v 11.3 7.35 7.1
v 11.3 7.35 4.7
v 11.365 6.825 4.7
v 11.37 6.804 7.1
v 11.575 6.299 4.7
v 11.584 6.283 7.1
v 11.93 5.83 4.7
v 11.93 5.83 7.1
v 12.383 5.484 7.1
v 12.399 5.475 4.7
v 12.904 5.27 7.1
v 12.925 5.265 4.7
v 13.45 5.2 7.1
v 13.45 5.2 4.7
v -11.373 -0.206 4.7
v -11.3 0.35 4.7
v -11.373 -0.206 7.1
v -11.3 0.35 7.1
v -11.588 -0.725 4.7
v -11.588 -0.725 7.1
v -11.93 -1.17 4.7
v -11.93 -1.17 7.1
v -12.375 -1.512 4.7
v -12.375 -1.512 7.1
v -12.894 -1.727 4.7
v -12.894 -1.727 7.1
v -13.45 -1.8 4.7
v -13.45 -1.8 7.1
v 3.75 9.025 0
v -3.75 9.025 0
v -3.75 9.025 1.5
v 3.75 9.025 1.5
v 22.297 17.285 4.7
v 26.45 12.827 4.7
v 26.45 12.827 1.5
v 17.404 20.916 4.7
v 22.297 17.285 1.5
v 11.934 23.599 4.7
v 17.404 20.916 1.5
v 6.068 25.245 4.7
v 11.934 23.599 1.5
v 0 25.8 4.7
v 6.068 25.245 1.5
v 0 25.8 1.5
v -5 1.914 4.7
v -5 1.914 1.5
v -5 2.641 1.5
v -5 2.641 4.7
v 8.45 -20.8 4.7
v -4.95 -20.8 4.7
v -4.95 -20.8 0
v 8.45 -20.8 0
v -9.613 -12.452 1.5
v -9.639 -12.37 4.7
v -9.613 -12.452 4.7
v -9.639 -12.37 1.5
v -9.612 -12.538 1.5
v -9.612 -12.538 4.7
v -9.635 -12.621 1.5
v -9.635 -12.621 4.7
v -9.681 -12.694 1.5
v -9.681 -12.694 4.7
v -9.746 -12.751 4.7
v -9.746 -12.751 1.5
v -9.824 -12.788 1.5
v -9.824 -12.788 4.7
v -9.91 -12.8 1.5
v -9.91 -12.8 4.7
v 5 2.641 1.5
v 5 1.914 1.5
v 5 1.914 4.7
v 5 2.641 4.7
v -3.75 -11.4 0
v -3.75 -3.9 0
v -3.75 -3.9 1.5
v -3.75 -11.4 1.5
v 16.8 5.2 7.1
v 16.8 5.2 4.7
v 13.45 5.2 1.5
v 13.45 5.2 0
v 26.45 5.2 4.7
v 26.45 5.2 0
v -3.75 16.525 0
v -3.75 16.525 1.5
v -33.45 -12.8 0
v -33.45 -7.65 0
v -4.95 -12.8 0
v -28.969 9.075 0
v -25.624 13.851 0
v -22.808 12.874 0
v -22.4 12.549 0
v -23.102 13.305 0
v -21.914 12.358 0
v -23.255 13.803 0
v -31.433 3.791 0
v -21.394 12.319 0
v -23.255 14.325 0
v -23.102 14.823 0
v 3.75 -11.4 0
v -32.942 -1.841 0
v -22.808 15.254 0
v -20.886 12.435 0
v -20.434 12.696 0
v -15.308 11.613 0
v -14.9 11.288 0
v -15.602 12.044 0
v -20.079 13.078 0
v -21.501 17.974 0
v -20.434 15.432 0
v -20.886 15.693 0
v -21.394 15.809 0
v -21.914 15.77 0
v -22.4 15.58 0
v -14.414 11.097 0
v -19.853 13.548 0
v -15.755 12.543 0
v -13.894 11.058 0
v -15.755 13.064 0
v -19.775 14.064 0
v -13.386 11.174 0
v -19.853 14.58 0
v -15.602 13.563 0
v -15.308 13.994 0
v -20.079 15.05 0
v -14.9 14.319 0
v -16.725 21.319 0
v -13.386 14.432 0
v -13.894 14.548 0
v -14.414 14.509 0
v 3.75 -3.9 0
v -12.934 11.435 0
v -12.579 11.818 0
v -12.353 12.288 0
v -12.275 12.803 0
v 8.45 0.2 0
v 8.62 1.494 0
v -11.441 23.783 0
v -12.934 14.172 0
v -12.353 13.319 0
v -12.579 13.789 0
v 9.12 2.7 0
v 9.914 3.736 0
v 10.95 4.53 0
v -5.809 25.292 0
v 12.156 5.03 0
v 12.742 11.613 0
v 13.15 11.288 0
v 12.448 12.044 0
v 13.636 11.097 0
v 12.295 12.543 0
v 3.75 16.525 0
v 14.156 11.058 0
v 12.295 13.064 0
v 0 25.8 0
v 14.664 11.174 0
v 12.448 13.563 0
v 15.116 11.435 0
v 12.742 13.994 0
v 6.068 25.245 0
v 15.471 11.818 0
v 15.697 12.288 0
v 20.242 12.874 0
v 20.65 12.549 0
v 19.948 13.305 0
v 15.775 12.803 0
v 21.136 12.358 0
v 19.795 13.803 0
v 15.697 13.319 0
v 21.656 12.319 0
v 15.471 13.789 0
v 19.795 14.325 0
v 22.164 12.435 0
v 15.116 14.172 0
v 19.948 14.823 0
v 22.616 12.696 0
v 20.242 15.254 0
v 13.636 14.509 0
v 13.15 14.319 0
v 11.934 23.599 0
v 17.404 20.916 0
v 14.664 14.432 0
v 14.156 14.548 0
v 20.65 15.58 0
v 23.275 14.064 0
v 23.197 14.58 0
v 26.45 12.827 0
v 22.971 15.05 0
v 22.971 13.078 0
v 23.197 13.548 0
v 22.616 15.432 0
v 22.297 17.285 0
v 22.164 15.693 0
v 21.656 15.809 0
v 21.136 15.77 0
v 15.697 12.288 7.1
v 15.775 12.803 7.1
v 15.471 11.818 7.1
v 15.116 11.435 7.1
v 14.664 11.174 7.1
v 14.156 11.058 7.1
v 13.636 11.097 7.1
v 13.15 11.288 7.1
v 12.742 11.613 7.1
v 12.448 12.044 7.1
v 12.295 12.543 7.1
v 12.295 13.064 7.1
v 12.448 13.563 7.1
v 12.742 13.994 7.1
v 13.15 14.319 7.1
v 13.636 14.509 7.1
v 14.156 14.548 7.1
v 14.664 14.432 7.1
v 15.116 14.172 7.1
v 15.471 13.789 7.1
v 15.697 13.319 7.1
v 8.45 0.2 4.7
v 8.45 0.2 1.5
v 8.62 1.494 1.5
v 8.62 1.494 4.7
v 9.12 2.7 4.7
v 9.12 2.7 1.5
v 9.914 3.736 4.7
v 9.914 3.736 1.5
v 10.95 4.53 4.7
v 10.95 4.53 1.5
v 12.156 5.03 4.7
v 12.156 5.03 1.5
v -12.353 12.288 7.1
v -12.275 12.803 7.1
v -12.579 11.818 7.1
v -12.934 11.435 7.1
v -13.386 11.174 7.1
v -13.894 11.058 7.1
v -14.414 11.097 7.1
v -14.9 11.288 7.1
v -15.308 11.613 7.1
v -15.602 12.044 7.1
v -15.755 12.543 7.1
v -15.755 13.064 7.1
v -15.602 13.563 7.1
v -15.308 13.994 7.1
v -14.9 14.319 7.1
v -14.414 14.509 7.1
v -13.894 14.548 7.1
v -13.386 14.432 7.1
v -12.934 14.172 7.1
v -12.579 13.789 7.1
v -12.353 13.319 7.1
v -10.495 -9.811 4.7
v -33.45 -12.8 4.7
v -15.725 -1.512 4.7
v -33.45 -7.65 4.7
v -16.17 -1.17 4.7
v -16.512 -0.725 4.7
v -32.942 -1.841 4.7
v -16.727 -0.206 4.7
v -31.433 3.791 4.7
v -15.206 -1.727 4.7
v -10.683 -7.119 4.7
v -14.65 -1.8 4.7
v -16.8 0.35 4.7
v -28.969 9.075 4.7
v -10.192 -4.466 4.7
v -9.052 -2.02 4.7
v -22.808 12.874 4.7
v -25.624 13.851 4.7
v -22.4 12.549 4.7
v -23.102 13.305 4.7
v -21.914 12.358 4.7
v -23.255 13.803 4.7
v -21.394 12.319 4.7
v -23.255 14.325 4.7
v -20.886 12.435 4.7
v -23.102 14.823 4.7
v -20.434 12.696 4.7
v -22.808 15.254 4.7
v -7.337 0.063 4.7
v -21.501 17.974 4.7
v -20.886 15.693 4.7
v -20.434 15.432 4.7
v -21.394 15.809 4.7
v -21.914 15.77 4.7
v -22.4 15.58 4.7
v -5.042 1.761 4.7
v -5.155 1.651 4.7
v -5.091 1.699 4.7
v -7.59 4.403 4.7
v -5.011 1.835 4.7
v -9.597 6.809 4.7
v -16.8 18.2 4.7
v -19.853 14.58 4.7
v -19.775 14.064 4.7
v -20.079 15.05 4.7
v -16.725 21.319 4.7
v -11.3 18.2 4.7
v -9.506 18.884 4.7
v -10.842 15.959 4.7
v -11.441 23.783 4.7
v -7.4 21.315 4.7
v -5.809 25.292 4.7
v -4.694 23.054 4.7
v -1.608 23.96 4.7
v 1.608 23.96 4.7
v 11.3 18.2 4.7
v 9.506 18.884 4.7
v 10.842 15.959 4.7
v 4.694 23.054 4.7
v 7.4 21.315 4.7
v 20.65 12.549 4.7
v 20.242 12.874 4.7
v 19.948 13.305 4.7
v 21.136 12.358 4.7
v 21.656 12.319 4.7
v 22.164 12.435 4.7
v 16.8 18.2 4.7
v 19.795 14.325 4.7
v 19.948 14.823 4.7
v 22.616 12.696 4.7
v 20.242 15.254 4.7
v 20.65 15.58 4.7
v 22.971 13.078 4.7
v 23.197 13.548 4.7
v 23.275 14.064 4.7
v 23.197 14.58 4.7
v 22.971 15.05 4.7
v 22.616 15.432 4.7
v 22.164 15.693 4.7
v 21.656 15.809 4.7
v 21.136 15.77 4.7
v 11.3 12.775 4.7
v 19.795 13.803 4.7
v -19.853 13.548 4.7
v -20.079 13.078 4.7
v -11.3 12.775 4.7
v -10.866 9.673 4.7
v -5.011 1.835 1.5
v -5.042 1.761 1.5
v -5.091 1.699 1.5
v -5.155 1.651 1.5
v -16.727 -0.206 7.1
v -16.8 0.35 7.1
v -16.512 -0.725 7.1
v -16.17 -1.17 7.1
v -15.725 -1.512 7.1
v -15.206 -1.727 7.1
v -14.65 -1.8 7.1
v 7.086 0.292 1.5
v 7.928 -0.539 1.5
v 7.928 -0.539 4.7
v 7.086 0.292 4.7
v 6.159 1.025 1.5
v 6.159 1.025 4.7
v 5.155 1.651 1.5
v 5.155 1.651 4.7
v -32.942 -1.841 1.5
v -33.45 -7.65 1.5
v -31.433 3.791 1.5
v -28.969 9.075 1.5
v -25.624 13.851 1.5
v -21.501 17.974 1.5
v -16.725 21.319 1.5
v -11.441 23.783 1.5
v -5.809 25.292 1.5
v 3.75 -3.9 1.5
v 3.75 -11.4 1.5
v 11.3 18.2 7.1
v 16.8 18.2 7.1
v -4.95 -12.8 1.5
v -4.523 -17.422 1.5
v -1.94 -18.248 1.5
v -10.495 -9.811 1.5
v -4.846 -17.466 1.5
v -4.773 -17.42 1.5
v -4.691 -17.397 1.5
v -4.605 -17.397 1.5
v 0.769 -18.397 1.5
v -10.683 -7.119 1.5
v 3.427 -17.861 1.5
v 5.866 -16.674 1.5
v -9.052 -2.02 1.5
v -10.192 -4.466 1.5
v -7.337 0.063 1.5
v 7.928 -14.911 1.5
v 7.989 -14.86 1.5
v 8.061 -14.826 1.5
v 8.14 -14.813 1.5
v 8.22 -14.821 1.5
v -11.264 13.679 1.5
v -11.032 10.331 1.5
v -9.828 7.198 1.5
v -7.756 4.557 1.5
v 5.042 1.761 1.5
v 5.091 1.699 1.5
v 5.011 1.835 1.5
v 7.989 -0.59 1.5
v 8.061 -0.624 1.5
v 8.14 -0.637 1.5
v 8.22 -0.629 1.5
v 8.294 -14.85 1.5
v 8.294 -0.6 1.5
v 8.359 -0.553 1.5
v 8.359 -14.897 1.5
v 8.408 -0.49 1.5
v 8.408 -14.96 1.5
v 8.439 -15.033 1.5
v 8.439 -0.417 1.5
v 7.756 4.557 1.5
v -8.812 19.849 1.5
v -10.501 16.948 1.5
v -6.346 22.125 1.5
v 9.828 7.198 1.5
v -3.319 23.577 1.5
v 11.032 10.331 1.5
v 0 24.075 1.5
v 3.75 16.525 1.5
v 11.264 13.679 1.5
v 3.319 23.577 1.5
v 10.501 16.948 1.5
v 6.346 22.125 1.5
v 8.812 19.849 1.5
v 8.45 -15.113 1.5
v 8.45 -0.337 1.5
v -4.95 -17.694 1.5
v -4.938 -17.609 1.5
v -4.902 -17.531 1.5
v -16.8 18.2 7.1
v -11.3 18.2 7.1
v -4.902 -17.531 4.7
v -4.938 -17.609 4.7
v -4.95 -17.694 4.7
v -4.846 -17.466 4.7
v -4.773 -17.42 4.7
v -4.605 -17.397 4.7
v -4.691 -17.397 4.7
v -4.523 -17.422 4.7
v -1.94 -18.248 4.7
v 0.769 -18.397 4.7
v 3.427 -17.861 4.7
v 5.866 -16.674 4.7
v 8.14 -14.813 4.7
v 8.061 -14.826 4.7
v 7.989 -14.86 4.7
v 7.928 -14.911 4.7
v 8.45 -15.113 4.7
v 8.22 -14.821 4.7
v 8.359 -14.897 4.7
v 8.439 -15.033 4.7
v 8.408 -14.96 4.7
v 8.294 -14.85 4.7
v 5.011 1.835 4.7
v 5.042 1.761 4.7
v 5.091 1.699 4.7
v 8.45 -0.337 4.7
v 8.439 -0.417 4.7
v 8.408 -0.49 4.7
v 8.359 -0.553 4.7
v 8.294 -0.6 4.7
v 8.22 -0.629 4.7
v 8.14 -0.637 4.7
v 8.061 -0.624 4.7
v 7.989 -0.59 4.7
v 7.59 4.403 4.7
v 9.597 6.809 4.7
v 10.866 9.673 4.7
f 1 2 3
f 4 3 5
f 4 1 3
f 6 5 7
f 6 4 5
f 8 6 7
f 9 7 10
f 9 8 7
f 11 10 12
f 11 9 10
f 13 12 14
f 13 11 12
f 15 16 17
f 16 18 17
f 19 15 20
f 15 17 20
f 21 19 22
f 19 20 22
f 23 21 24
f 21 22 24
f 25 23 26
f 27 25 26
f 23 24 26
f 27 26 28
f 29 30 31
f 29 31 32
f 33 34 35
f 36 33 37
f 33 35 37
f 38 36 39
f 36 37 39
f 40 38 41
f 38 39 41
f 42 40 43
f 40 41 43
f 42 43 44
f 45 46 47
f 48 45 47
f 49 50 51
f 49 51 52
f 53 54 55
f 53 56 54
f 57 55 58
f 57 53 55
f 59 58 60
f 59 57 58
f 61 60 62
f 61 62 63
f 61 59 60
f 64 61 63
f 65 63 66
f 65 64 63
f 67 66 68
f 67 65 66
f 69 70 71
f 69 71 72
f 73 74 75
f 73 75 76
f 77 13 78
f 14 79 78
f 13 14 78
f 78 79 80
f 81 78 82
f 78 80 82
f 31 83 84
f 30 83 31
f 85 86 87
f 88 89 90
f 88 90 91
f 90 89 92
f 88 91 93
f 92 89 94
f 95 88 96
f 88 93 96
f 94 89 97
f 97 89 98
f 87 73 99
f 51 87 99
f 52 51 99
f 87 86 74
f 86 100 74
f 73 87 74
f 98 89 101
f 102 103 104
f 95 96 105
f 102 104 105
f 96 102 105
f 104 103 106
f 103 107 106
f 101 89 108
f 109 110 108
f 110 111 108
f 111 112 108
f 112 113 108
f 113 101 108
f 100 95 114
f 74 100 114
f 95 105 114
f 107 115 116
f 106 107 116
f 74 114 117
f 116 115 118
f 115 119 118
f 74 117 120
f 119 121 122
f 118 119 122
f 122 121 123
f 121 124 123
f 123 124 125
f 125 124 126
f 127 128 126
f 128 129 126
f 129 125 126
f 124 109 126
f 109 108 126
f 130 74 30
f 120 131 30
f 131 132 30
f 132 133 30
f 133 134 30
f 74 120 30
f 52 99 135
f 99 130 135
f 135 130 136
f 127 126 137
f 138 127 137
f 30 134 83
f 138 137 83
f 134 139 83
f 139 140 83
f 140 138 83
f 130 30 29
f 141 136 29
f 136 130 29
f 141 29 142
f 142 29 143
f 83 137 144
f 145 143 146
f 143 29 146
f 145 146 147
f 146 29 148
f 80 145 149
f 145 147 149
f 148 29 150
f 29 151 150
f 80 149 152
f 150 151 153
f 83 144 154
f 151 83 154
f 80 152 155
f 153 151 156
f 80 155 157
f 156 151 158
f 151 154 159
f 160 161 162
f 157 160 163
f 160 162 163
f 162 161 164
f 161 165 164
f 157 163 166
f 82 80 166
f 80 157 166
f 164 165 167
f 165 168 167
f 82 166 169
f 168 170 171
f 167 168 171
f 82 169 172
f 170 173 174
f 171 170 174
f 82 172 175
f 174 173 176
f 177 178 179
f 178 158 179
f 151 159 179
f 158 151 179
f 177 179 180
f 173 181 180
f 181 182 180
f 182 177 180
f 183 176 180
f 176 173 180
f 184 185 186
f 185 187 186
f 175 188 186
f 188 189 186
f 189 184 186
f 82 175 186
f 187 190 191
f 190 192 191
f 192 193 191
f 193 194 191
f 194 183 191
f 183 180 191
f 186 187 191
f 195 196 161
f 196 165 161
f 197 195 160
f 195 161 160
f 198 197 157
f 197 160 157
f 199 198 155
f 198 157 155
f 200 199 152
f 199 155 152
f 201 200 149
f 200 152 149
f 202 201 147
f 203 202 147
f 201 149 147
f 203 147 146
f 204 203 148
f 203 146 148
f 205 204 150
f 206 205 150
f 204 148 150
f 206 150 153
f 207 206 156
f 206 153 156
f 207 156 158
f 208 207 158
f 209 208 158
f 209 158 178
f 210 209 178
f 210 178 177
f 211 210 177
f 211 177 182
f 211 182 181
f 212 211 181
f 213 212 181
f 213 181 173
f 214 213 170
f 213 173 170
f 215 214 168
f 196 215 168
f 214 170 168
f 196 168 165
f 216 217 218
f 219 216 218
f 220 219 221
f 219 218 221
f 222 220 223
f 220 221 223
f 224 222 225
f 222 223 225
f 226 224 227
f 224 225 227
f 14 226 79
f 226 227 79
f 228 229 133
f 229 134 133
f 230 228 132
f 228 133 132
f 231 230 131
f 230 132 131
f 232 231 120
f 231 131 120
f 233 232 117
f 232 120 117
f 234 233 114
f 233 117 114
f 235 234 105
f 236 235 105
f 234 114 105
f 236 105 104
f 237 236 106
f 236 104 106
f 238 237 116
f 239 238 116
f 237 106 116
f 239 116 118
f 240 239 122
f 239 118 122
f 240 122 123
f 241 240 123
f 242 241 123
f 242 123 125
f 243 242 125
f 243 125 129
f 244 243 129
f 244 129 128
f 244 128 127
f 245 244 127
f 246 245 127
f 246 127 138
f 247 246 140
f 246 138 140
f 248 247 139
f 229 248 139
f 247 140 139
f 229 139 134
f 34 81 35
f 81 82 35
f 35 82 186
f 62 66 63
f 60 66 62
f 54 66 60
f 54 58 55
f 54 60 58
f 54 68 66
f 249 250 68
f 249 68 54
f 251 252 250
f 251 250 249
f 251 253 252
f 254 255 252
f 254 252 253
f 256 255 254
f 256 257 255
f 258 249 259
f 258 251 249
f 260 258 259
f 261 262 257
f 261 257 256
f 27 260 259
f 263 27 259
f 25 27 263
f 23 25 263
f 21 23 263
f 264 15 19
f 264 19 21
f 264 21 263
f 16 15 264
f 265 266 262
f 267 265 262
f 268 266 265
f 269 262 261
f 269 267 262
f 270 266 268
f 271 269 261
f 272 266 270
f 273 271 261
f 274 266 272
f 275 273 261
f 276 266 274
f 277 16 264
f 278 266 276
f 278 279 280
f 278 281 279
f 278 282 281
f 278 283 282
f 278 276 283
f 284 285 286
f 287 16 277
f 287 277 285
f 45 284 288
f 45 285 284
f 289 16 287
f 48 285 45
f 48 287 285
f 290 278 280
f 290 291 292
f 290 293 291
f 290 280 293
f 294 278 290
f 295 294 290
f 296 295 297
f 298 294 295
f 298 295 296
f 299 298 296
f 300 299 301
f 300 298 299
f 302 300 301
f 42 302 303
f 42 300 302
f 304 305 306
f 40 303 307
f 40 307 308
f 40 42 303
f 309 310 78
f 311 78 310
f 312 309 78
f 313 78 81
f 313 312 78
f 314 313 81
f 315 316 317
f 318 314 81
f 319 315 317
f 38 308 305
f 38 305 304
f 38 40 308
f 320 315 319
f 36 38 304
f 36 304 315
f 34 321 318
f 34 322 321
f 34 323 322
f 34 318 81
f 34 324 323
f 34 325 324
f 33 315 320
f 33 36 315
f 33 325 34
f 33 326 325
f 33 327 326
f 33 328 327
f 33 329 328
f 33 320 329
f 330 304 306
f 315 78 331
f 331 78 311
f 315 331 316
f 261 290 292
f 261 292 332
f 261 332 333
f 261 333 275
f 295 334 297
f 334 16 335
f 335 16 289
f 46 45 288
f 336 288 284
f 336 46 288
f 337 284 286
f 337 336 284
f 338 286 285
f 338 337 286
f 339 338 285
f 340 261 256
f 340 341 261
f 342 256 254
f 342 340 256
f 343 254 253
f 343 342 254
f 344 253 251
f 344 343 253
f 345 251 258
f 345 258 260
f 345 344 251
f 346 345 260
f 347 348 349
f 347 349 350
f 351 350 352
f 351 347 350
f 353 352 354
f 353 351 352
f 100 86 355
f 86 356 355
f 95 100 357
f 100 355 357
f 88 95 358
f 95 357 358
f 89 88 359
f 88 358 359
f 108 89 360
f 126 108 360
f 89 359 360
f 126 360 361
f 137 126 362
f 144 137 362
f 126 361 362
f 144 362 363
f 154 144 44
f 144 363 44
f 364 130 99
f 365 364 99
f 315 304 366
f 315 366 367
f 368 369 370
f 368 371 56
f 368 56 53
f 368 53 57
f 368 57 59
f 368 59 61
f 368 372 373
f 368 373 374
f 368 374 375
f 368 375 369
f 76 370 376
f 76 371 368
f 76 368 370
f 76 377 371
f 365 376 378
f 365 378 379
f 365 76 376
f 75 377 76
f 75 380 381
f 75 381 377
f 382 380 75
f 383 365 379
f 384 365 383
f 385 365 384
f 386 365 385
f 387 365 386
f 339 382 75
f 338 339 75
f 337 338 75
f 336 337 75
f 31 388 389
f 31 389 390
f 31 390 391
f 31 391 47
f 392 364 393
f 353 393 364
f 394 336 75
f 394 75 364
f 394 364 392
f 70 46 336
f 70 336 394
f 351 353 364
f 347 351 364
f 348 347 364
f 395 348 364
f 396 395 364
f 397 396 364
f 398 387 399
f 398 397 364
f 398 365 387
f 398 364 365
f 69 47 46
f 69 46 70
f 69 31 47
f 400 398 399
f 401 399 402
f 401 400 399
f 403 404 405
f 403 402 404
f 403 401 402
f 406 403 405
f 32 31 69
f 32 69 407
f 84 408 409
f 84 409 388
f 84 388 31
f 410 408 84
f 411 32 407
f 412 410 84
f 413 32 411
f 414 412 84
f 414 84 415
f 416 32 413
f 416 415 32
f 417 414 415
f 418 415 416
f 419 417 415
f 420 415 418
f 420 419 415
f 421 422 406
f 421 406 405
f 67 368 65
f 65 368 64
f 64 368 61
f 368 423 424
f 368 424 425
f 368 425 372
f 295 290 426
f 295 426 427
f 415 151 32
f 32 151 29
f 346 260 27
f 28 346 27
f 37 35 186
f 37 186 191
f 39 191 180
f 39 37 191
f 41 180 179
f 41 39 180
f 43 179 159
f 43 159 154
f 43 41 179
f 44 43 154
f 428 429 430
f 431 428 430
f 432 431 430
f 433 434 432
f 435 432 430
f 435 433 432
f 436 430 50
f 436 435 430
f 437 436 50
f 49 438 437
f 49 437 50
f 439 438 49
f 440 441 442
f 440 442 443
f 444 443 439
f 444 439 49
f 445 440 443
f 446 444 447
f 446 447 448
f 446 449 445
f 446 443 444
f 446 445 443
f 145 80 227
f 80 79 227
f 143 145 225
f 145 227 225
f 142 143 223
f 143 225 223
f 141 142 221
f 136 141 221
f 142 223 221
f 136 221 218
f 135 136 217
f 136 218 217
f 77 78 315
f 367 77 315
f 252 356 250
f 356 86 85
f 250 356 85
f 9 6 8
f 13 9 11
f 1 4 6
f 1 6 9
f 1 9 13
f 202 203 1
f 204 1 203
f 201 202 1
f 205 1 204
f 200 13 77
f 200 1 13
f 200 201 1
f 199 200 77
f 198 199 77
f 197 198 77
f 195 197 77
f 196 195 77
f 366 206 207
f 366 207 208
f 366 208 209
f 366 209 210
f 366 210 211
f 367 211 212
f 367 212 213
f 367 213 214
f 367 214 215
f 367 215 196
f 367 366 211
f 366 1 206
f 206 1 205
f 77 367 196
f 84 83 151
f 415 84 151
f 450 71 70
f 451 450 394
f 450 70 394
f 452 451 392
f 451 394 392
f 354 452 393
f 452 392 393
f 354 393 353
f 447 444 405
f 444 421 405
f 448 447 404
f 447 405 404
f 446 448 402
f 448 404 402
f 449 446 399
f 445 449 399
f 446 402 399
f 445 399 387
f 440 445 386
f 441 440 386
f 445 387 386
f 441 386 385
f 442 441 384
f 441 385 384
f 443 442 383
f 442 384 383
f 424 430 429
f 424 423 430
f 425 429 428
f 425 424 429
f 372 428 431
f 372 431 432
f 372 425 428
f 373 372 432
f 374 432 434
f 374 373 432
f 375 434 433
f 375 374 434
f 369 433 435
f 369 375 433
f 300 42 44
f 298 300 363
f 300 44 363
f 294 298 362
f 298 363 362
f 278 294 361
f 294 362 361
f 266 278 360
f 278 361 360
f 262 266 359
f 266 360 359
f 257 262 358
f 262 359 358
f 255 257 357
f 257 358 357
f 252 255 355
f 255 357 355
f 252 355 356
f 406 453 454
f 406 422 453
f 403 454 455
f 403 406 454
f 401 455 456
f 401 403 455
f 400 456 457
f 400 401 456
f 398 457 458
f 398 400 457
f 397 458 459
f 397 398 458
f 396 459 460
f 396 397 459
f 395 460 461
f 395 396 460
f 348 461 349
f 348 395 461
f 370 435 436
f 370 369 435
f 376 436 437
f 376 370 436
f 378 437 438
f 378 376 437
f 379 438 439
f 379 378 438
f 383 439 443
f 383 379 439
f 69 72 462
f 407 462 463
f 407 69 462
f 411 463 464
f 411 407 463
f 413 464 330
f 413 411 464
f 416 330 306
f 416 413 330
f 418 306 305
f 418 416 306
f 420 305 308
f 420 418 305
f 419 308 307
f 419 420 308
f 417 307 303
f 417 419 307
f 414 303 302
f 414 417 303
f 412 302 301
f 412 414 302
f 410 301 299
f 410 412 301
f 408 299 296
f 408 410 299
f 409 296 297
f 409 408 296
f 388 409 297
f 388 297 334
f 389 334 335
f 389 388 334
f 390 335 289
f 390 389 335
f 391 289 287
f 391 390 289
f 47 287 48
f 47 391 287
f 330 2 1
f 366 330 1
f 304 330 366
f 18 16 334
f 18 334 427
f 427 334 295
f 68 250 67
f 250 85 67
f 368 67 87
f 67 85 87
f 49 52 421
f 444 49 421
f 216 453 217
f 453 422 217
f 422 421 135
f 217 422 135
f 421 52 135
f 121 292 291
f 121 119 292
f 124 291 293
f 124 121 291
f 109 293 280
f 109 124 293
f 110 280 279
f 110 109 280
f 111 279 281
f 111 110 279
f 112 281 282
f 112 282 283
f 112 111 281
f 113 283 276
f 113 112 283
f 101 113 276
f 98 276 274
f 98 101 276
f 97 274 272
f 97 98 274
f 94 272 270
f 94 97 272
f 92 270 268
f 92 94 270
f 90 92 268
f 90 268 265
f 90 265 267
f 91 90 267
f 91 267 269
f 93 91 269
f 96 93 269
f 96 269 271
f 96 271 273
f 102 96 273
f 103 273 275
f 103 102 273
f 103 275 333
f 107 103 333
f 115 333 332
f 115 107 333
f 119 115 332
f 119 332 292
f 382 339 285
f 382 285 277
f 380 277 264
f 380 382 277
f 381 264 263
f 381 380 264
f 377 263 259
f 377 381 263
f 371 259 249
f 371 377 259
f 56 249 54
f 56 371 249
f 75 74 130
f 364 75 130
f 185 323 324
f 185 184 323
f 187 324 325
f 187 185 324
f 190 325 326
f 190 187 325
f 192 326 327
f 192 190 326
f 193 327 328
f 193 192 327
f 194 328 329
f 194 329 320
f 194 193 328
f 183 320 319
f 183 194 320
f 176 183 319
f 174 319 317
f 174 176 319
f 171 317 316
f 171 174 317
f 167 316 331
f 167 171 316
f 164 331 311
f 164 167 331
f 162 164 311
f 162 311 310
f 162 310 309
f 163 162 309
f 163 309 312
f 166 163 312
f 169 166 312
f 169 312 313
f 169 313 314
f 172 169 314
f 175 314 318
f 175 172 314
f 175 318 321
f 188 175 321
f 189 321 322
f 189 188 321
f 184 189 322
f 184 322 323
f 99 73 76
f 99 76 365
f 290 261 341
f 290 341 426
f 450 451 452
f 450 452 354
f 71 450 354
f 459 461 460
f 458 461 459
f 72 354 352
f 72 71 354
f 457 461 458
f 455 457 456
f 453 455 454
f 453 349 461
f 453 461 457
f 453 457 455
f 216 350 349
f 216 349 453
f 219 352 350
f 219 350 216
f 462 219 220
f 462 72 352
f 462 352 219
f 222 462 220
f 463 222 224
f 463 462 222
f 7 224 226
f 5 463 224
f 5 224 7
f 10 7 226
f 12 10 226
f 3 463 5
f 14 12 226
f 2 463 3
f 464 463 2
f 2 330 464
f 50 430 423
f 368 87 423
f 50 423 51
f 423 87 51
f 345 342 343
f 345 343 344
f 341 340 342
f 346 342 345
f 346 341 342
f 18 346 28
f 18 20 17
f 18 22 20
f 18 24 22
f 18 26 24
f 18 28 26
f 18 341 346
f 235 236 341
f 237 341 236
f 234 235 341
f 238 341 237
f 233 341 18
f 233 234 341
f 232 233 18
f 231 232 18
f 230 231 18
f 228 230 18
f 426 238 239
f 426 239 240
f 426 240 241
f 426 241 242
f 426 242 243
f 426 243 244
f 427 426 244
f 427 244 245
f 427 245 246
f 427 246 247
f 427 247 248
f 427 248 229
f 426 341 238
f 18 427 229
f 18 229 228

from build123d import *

# Parameters (mm, degrees)
F0_W      = 66.9
F0_H      = 51.6
F1_DEPTH  = 1.5
F2_R      = 33.44999
F3_R      = 1.75
F5_DEPTH  = 10
F6_W      = 60
F6_H      = 1.5
F7_DEPTH  = 7
F8_W      = 28.5
F8_H      = 1.5
F9_DEPTH  = 13
F10_W     = 18
F10_H     = 1.5
F11_DEPTH = 31
F12_R     = 5
F13_R     = 1.75
F13_R_2   = 11.3
F15_DEPTH = 3.2
F16_R     = 10.7
F17_DEPTH = 3.2
F18_W     = 10
F18_H     = 8
F19_DEPTH = 5
F14_W     = 7.5
F14_H     = 7.5
F20_DEPTH = 25
F21_W     = 13.4
F21_H     = 4.7
F22_DEPTH = 5
F23_W     = 5.5
F23_H     = 20
F23_H_2   = 13
F24_DEPTH = 2.4
F25_R     = 1.75
F26_DEPTH = 25
F27_R     = 2.15
F28_R     = 0.3


# Not quite as in the source:
# - a fillet or chamfer is up to 0.001 mm smaller than in the source, because OpenCascade refuses the exact size
# - ends of sketch curves that miss each other by under 0.0002 mm in the source are joined


with BuildPart() as f1:
    # F0 (on Top) → F1 (new body)
    with BuildSketch(Plane.XY):
        Rectangle(F0_W, F0_H)
    extrude(amount=F1_DEPTH)

    # F2 (radius 33.45 in the source; OpenCascade refuses exactly that, so slightly less here)
    f2_edges = [f1.edges().sort_by_distance(p)[0] for p in [
        (-33.45, 25.8, 0.75),
        (33.45, 25.8, 0.75),
    ]]
    fillet(f2_edges, radius=F2_R)

    # F3 (on Top) → F5 (cut)
    with BuildSketch(Plane.XY):
        with Locations((-21.525, 14.0641658831)):
            Circle(F3_R)
        with Locations((-14.025, 12.8033463032)):
            Circle(F3_R)
        with Locations((21.525, 14.0641658831)):
            Circle(F3_R)
        with Locations((14.025, 12.8033463032)):
            Circle(F3_R)
    extrude(amount=F5_DEPTH, mode=Mode.SUBTRACT)

    # F6 (on face) → F7 (cut)
    with BuildSketch(Plane.YZ.offset(33.45)):
        with Locations((4.2, 0.75)):
            Rectangle(F6_W, F6_H)
    extrude(amount=-F7_DEPTH, mode=Mode.SUBTRACT)

    # F8 (on face) → F9 (cut)
    with BuildSketch(Plane.XZ.offset(25.8)):
        with Locations((-19.2, 0.75)):
            Rectangle(F8_W, F8_H)
    extrude(amount=-F9_DEPTH, mode=Mode.SUBTRACT)

    # F10 (on face) → F11 (cut)
    with BuildSketch(Plane.XZ.offset(25.8)):
        with Locations((17.45, 0.75)):
            Rectangle(F10_W, F10_H)
    extrude(amount=-F11_DEPTH, mode=Mode.SUBTRACT)

    # F12
    f12_edges = [f1.edges().sort_by_distance(p)[0] for p in [
        (8.45, 5.2, 0.75),
    ]]
    fillet(f12_edges, radius=F12_R)

    # F13 (on face) → F15 (join)
    with BuildSketch(Plane.XY.offset(1.5)):
        with BuildLine():
            ThreePointArc((8.45, 0.2), (9.9144660941, 3.7355339059), (13.45, 5.2))
            Line((13.45, 5.2), (26.45, 5.2))
            Line((26.45, 5.2), (26.45, 12.8268227403))
            ThreePointArc((26.45, 12.8268227403), (14.7301262522, 22.3820846236), (1e-05, 25.8))
            ThreePointArc((1e-05, 25.8), (-23.6527247596, 16.0027247596), (-33.45, -7.64999))
            Line((-33.45, -7.64999), (-33.45, -12.8))
            Line((-33.45, -12.8), (-4.95, -12.8))
            Line((-4.95, -12.8), (-4.95, -25.8))
            Line((-4.95, -25.8), (8.45, -25.8))
            Line((8.45, -25.8), (8.45, 0.2))
        make_face()
        with Locations((-14.025, 12.8033463032)):
            Circle(F13_R, mode=Mode.SUBTRACT)
        with Locations((-21.525, 14.0641658831)):
            Circle(F13_R, mode=Mode.SUBTRACT)
        with Locations((0, 12.775)):
            Circle(F13_R_2, mode=Mode.SUBTRACT)
        with Locations((14.025, 12.8033463032)):
            Circle(F13_R, mode=Mode.SUBTRACT)
        with Locations((21.525, 14.0641658831)):
            Circle(F13_R, mode=Mode.SUBTRACT)
    extrude(amount=F15_DEPTH)

    # F16 (on face) → F17 (cut)
    with BuildSketch(Plane.XY.offset(1.5)):
        with Locations((0, -7.725)):
            Circle(F16_R)
    extrude(amount=F17_DEPTH, mode=Mode.SUBTRACT)

    # F18 (on face) → F19 (cut)
    with BuildSketch(Plane.XY.offset(1.5)):
        Rectangle(F18_W, F18_H)
    extrude(amount=F19_DEPTH, mode=Mode.SUBTRACT)

    # F14 (on face) → F20 (cut)
    with BuildSketch(Plane(origin=(0, 0, 0), x_dir=(1, 0, 0), z_dir=(0, 0, -1))):
        with Locations((0, -12.775)):
            Rectangle(F14_W, F14_H)
        with Locations((0, 7.65)):
            Rectangle(F14_W, F14_H)
    extrude(amount=-F20_DEPTH, mode=Mode.SUBTRACT)

    # F21 (on face) → F22 (cut)
    with BuildSketch(Plane.XZ.offset(25.8)):
        with Locations((1.75, 2.35)):
            Rectangle(F21_W, F21_H)
    extrude(amount=-F22_DEPTH, mode=Mode.SUBTRACT)

    # F23 (on face) → F24 (join)
    with BuildSketch(Plane.XY.offset(4.7)):
        with Locations((-14.05, 8.2)):
            Rectangle(F23_W, F23_H)
        with Locations((14.05, 11.7)):
            Rectangle(F23_W, F23_H_2)
    extrude(amount=F24_DEPTH)

    # F25 (on face) → F26 (cut)
    with BuildSketch(Plane(origin=(0, 0, 0), x_dir=(1, 0, 0), z_dir=(0, 0, -1))):
        with Locations((14.025, -12.8033463032)):
            Circle(F25_R)
        with Locations((-14.025, -12.8033463032)):
            Circle(F25_R)
    extrude(amount=-F26_DEPTH, mode=Mode.SUBTRACT)

    # F27
    f27_edges = [f1.edges().sort_by_distance(p)[0] for p in [
        (11.3, 5.2, 5.9),
        (-11.3, -1.8, 5.9),
        (-16.8, -1.8, 5.9),
    ]]
    fillet(f27_edges, radius=F27_R)

    # F28
    f28_edges = [f1.edges().sort_by_distance(p)[0] for p in [
        (-9.419893, -12.8, 3.1),
        (5, 1.734915, 3.1),
        (8.45, -1.160893, 3.1),
        (8.45, -14.289107, 3.1),
        (-4.95, -17.211174, 3.1),
        (-5, 1.734915, 3.1),
    ]]
    fillet(f28_edges, radius=F28_R)


solid = f1.part
